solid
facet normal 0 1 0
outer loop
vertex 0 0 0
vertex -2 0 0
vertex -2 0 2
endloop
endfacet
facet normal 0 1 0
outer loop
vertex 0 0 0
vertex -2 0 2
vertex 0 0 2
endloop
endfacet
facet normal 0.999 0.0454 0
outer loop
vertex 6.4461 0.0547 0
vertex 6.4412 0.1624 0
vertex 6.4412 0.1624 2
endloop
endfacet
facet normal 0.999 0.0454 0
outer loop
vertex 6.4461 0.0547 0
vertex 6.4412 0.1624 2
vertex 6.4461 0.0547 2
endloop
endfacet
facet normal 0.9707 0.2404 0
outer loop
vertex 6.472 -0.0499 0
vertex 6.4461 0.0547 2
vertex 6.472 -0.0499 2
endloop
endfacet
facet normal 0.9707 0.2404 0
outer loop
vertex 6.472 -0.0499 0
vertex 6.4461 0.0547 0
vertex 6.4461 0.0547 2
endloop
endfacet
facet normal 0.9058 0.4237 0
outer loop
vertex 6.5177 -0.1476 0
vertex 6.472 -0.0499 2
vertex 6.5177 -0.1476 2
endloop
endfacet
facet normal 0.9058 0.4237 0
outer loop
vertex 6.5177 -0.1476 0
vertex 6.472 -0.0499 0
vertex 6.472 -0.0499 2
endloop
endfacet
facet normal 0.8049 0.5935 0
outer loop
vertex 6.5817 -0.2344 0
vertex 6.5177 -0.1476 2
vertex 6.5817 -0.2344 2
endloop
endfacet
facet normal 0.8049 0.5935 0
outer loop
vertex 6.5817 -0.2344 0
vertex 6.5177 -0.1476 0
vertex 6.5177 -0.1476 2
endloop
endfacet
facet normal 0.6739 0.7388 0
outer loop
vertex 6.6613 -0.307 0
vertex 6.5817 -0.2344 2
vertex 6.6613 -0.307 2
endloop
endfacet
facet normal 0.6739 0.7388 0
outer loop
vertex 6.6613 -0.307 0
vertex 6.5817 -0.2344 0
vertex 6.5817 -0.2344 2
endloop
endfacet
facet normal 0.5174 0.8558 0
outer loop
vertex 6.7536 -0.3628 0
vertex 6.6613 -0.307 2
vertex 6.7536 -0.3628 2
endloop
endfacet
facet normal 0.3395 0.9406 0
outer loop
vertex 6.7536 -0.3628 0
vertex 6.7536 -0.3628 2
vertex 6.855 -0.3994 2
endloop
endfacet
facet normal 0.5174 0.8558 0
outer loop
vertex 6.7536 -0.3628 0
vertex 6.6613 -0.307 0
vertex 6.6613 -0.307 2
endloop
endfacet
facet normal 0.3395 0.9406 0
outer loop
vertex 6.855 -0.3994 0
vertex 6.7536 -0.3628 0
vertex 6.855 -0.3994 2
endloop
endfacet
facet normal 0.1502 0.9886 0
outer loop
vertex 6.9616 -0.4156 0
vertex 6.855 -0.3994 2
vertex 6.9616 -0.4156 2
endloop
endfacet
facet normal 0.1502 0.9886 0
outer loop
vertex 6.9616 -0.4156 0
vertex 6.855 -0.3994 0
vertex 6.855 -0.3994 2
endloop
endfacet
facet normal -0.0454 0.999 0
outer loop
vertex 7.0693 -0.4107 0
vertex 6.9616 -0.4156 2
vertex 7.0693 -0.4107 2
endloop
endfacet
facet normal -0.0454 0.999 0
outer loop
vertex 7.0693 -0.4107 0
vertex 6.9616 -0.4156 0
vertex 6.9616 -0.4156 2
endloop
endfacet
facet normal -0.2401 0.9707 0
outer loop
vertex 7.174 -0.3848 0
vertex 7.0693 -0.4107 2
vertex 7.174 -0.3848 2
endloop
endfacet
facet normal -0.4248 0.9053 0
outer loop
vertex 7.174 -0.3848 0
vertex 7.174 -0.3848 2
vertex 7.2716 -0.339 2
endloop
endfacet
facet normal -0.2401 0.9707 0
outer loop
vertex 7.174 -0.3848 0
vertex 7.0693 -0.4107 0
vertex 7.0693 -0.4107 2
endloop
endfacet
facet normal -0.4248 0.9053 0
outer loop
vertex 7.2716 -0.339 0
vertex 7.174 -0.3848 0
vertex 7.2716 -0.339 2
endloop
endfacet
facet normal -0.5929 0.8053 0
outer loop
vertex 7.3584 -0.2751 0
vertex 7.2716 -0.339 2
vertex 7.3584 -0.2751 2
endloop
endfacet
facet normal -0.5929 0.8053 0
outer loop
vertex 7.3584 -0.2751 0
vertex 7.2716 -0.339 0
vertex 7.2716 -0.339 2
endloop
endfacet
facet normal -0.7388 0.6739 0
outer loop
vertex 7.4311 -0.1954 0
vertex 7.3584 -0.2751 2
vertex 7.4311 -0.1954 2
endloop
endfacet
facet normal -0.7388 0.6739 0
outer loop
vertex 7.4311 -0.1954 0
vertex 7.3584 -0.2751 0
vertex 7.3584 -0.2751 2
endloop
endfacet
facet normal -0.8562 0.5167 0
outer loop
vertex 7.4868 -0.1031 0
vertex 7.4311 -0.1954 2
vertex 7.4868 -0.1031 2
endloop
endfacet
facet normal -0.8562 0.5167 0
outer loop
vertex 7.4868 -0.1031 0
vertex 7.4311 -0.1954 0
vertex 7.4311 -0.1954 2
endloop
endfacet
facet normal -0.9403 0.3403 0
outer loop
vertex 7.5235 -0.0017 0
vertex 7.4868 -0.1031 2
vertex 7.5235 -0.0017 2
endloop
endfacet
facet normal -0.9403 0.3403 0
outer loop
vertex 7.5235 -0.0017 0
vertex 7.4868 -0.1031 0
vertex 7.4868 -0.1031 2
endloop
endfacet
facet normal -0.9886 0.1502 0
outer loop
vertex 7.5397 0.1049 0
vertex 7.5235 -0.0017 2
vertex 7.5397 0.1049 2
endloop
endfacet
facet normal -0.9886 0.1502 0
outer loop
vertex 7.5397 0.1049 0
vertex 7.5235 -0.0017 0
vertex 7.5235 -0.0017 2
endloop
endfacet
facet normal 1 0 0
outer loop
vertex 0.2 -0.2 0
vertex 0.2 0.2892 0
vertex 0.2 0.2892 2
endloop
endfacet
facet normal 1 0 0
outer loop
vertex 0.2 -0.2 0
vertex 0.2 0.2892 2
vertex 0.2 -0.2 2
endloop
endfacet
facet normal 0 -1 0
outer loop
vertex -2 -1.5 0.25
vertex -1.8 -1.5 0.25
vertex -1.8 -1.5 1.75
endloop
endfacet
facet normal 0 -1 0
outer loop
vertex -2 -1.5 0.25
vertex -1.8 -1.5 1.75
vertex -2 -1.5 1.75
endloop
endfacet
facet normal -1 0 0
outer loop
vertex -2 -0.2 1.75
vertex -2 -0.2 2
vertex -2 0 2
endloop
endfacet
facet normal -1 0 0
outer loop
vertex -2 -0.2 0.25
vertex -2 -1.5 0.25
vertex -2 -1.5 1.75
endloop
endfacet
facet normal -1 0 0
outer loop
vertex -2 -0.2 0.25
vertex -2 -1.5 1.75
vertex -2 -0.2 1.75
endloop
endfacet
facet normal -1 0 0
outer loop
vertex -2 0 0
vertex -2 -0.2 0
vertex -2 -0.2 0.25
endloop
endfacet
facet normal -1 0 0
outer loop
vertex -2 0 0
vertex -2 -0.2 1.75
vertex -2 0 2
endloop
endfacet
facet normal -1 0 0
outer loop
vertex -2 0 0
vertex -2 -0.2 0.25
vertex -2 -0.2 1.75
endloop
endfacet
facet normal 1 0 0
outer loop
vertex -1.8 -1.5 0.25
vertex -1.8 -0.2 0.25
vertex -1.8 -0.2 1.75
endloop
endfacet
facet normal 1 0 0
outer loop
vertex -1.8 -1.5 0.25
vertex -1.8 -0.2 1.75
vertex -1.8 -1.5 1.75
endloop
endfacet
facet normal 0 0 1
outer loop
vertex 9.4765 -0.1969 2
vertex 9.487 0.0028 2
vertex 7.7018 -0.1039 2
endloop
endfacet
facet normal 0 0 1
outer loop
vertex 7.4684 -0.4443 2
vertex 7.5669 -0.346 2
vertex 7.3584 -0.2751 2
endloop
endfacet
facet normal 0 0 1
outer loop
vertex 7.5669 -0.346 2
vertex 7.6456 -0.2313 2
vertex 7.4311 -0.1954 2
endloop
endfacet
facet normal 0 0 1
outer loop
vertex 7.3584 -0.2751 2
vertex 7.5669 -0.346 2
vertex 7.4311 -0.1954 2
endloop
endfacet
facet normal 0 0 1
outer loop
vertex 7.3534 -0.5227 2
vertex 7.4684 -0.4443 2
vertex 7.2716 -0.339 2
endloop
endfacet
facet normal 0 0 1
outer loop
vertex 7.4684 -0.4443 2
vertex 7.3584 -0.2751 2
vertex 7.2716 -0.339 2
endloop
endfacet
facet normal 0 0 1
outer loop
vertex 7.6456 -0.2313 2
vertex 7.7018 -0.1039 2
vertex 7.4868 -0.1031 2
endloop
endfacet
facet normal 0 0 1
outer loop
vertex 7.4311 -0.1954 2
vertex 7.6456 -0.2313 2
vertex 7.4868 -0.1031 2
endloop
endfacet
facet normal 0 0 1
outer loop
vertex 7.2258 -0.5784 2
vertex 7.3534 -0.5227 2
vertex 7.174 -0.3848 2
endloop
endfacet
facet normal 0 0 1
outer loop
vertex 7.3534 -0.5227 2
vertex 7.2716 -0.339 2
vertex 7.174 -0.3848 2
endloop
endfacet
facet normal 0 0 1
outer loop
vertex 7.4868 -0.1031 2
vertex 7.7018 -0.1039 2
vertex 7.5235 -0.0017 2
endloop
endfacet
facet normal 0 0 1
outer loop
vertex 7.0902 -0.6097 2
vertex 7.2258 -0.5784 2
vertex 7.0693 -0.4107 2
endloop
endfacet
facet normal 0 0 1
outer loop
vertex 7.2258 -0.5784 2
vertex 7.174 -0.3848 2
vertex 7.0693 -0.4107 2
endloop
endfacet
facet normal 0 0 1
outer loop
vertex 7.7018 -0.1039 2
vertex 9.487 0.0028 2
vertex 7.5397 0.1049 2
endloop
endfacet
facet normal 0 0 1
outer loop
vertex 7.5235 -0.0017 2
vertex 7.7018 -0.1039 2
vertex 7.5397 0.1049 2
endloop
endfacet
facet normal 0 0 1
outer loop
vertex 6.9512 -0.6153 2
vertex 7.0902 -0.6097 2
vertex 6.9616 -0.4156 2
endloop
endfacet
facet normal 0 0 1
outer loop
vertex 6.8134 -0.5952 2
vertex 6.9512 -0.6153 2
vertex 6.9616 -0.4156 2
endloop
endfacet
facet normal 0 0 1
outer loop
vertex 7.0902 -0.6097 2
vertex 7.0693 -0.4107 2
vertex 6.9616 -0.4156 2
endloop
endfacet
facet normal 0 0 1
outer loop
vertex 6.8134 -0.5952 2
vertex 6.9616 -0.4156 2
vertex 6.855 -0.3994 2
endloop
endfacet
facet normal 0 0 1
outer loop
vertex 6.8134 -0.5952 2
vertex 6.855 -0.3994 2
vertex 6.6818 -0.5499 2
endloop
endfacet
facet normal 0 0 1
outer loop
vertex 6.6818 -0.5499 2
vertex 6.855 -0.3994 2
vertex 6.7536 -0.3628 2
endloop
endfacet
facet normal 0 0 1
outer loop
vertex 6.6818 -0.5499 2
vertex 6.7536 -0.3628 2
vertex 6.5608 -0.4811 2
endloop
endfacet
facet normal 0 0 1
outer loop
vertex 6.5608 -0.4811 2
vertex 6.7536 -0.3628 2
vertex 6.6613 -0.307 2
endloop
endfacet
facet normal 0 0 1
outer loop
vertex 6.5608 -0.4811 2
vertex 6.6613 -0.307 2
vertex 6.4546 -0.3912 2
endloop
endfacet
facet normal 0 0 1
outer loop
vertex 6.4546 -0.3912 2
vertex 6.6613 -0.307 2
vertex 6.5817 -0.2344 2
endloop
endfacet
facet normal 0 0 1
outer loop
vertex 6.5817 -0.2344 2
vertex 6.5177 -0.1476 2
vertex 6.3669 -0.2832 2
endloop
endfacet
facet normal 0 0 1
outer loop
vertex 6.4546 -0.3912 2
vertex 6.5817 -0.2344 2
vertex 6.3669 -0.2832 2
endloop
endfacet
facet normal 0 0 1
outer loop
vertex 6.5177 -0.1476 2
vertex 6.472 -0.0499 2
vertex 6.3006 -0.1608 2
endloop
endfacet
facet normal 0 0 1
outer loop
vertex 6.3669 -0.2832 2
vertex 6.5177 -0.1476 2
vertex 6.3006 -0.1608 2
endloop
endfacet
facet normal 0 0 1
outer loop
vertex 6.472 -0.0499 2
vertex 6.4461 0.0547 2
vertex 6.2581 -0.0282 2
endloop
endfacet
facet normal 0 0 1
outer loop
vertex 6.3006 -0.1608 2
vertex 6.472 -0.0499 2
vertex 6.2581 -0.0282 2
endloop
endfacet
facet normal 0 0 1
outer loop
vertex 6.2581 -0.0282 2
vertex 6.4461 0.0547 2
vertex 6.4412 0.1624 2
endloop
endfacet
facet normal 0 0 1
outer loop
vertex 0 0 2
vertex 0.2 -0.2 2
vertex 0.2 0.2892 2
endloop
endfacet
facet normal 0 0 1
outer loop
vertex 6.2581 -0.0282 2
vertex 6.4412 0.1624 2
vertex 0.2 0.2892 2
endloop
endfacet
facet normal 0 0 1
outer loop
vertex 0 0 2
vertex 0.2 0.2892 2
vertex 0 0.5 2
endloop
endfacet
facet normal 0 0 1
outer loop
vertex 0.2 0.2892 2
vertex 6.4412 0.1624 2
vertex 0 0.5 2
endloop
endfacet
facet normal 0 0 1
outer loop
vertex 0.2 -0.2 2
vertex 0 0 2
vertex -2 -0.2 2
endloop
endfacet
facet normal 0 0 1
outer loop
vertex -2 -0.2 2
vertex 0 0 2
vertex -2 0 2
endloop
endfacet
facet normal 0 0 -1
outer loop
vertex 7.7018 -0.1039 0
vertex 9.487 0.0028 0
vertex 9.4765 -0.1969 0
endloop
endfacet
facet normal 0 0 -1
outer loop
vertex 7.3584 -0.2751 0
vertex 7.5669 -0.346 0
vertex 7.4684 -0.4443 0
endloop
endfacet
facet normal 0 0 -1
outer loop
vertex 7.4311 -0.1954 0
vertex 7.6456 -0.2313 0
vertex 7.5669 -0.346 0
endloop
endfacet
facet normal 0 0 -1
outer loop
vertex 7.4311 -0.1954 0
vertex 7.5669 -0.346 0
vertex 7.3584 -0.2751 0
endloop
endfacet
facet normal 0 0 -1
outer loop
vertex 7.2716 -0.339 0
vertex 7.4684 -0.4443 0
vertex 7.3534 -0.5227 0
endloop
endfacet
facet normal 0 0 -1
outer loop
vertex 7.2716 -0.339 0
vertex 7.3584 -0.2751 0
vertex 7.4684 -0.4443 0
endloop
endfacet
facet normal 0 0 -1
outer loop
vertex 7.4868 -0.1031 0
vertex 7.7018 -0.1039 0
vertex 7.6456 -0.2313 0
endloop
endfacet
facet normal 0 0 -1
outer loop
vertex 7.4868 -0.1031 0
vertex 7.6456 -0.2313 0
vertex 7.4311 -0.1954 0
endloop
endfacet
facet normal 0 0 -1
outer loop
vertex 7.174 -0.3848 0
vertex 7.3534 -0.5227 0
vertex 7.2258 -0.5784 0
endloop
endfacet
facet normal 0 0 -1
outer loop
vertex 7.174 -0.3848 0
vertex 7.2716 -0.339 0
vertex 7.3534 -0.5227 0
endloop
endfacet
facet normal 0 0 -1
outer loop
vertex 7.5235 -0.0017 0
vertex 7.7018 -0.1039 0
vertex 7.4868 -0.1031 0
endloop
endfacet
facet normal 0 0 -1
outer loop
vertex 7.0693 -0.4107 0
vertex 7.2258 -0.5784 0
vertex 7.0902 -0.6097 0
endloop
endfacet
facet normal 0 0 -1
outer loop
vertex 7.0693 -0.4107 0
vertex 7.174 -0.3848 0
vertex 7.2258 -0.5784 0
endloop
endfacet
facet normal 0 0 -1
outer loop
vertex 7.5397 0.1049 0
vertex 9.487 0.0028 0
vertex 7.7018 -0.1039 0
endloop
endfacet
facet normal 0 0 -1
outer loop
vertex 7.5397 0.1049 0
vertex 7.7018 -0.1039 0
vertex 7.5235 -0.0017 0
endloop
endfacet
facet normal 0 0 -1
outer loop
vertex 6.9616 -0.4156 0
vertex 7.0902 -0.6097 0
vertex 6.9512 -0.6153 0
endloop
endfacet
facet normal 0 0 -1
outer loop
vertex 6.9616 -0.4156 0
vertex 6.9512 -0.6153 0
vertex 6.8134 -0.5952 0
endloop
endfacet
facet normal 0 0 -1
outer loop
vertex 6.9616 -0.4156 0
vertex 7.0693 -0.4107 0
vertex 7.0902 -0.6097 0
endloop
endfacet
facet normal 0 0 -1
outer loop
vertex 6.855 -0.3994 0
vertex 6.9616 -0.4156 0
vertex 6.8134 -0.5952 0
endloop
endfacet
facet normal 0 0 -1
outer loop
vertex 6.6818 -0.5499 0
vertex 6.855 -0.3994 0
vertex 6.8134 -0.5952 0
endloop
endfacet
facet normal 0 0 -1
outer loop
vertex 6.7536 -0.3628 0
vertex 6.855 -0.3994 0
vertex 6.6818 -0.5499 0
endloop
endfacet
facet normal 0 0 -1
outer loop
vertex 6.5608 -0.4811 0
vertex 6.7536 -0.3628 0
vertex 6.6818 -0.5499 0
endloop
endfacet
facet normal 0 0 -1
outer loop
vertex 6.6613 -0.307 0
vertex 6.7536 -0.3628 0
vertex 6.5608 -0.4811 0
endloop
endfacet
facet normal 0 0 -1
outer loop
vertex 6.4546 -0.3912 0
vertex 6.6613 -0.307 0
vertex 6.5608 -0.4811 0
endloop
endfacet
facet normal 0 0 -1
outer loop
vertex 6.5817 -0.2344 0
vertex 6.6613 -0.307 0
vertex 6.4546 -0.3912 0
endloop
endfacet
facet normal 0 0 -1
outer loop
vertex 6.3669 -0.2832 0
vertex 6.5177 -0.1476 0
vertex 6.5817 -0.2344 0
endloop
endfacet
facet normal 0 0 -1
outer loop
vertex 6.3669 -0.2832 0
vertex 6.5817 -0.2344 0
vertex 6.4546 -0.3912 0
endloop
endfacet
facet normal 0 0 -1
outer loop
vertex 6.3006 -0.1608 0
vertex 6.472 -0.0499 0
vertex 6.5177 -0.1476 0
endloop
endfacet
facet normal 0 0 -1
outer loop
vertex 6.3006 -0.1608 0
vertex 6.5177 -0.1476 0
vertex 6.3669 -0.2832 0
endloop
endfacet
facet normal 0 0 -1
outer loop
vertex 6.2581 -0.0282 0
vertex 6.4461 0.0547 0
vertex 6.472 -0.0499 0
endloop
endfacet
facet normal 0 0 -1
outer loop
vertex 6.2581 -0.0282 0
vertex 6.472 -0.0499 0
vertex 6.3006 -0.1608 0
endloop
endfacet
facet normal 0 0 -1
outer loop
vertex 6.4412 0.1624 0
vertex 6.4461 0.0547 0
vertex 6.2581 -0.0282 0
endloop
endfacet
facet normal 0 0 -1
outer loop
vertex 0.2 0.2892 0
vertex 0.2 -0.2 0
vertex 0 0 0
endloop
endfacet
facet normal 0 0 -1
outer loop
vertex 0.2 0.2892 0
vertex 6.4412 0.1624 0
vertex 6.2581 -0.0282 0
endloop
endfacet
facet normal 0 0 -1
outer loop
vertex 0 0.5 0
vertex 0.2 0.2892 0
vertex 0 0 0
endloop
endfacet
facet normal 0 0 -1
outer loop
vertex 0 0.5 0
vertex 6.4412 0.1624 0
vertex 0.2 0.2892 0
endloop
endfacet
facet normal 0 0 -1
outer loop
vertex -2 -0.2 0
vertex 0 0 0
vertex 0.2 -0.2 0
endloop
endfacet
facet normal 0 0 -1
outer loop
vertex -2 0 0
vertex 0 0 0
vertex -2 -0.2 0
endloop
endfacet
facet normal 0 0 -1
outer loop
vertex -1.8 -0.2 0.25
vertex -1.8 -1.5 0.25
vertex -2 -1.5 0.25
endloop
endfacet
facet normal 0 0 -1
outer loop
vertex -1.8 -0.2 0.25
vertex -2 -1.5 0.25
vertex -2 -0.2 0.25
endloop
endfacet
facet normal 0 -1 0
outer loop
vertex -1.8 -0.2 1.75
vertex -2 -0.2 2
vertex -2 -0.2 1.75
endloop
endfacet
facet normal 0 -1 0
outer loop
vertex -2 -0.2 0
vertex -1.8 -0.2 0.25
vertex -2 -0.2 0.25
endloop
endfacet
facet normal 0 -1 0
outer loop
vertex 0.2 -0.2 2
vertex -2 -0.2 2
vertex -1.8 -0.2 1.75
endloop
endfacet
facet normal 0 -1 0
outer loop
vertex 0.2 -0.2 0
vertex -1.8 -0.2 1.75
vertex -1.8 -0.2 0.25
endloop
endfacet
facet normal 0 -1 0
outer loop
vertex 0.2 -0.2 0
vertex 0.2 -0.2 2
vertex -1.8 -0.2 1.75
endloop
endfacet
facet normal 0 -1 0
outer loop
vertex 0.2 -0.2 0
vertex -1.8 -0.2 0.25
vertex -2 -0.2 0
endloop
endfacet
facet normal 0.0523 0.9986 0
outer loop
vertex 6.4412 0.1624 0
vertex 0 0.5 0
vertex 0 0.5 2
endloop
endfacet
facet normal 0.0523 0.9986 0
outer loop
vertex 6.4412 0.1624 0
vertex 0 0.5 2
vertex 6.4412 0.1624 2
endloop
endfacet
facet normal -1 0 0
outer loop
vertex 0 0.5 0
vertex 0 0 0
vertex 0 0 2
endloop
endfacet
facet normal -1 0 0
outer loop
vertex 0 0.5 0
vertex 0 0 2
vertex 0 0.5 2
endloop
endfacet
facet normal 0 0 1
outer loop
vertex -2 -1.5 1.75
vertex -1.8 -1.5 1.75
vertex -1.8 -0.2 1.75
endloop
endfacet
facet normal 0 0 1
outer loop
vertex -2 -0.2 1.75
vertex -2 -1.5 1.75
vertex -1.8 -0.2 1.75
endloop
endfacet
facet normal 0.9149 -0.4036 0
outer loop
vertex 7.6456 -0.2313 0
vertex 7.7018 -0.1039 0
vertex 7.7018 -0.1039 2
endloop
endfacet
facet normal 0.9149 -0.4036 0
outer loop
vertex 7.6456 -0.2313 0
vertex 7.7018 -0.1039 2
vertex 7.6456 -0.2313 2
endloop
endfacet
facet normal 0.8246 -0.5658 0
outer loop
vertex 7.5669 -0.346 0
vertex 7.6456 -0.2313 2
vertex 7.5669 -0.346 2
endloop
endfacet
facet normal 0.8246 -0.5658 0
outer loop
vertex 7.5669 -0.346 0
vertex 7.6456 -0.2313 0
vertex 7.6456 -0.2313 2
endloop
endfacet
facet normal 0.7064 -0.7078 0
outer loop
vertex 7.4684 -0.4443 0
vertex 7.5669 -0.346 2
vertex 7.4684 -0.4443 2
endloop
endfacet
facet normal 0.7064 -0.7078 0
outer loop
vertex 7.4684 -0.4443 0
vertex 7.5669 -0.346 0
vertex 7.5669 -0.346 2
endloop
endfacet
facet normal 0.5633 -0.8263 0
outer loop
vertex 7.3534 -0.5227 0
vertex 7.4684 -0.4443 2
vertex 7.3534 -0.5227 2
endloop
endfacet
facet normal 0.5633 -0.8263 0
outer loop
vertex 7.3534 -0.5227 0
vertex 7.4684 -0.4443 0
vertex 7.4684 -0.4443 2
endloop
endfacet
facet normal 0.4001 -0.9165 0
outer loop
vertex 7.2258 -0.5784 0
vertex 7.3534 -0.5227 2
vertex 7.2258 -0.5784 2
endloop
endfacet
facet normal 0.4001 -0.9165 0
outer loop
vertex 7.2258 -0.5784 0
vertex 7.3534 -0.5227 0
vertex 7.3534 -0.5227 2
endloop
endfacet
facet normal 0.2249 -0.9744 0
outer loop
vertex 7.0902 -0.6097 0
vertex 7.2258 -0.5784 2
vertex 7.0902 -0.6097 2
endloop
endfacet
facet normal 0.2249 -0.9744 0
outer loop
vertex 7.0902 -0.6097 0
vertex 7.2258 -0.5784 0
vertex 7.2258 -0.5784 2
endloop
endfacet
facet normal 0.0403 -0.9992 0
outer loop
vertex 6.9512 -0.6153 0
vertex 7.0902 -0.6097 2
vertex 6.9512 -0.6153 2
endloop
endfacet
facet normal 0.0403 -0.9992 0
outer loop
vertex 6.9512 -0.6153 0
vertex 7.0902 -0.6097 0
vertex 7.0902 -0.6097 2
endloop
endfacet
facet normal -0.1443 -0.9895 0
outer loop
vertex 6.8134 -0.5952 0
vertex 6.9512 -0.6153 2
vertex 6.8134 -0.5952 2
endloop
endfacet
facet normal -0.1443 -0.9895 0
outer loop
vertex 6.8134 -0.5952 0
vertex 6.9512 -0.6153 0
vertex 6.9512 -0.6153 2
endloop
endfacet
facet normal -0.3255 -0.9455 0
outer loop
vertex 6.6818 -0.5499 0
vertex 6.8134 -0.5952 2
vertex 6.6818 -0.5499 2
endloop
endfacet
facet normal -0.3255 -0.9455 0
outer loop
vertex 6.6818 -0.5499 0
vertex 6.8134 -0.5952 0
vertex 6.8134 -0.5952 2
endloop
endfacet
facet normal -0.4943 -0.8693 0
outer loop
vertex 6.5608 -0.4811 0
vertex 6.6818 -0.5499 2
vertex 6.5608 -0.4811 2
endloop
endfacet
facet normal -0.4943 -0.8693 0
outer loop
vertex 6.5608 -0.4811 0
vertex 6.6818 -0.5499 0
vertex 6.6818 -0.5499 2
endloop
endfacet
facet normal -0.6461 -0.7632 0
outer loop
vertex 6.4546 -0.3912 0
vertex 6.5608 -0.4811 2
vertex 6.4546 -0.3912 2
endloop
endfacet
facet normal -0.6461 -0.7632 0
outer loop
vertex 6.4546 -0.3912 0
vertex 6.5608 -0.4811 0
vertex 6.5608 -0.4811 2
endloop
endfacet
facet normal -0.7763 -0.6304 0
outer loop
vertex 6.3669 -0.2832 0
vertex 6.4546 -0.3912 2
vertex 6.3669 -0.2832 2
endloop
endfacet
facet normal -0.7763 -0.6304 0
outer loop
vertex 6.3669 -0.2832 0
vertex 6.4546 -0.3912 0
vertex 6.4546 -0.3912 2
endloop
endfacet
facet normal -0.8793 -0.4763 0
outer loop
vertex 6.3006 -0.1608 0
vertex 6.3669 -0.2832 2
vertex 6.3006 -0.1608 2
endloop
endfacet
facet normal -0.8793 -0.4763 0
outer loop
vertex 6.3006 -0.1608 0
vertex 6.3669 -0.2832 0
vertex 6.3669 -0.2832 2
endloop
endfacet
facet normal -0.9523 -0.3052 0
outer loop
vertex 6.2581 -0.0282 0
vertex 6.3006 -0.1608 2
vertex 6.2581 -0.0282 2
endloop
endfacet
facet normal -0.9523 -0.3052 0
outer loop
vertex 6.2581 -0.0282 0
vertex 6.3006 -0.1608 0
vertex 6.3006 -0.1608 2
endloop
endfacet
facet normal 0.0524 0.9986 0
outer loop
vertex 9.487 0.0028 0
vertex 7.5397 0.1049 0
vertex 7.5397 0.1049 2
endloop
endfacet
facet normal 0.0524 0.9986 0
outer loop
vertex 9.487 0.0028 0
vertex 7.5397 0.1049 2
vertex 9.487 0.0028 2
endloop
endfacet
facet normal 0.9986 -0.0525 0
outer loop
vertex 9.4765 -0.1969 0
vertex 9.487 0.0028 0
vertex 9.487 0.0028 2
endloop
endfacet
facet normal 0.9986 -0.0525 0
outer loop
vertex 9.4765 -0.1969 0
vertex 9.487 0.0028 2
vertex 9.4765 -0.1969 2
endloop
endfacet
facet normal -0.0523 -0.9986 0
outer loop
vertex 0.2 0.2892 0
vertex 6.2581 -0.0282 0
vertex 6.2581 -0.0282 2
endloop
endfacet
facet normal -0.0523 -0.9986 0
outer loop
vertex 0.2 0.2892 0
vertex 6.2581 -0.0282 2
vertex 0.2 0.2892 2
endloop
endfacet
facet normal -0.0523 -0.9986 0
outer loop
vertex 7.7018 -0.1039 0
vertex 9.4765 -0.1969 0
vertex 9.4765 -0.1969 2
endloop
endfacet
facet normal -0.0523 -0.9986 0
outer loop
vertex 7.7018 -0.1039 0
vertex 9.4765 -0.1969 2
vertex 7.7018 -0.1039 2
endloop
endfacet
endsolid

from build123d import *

# Parameters (mm, degrees)
EXTRUDE_1_DEPTH     = 2
SKETCH_3_W          = 0.25
SKETCH_3_H          = 1.3
CUT_EXTRUDE_2_DEPTH = 1.2


with BuildPart() as part:
    # 草图1 → 凸台-拉伸1 (new body)
    with BuildSketch(Plane.XY):
        with BuildLine():
            Line((0, 0), (0, 0.5))
            Line((0, 0.5), (6.441160499, 0.162433082))
            ThreePointArc((6.441160499, 0.162433082), (6.961621967, -0.415597938), (7.539652987, 0.10486353))
            Line((7.539652987, 0.10486353), (9.48698058, 0.002808416))
            Line((9.48698058, 0.002808416), (9.476513389, -0.196917491))
            Line((9.476513389, -0.196917491), (7.701790537, -0.103908208))
            ThreePointArc((7.701790537, -0.103908208), (6.951154776, -0.615323845), (6.258088567, -0.028246994))
            Line((6.258088567, -0.028246994), (0.2, 0.289243975))
            Line((0.2, 0.289243975), (0.2, -0.2))
            Line((0.2, -0.2), (-1.8, -0.2))
            Line((-1.8, -0.2), (-1.8, -1.5))
            Line((-1.8, -1.5), (-2, -1.5))
            Line((-2, -1.5), (-2, 0))
            Line((-2, 0), (0, 0))
        make_face()
    extrude(amount=EXTRUDE_1_DEPTH)

    # 草图3 → 切除-拉伸2 (cut, through all)
    with BuildSketch(Plane(origin=(-1.8, 0, 0), x_dir=(0, 0, -1), z_dir=(1, 0, 0))):
        with Locations((-1.875, -0.85)):
            Rectangle(SKETCH_3_W, SKETCH_3_H)
        with Locations((-0.125, -0.85)):
            Rectangle(SKETCH_3_W, SKETCH_3_H)
    extrude(amount=-CUT_EXTRUDE_2_DEPTH, mode=Mode.SUBTRACT)


solid = part.part
